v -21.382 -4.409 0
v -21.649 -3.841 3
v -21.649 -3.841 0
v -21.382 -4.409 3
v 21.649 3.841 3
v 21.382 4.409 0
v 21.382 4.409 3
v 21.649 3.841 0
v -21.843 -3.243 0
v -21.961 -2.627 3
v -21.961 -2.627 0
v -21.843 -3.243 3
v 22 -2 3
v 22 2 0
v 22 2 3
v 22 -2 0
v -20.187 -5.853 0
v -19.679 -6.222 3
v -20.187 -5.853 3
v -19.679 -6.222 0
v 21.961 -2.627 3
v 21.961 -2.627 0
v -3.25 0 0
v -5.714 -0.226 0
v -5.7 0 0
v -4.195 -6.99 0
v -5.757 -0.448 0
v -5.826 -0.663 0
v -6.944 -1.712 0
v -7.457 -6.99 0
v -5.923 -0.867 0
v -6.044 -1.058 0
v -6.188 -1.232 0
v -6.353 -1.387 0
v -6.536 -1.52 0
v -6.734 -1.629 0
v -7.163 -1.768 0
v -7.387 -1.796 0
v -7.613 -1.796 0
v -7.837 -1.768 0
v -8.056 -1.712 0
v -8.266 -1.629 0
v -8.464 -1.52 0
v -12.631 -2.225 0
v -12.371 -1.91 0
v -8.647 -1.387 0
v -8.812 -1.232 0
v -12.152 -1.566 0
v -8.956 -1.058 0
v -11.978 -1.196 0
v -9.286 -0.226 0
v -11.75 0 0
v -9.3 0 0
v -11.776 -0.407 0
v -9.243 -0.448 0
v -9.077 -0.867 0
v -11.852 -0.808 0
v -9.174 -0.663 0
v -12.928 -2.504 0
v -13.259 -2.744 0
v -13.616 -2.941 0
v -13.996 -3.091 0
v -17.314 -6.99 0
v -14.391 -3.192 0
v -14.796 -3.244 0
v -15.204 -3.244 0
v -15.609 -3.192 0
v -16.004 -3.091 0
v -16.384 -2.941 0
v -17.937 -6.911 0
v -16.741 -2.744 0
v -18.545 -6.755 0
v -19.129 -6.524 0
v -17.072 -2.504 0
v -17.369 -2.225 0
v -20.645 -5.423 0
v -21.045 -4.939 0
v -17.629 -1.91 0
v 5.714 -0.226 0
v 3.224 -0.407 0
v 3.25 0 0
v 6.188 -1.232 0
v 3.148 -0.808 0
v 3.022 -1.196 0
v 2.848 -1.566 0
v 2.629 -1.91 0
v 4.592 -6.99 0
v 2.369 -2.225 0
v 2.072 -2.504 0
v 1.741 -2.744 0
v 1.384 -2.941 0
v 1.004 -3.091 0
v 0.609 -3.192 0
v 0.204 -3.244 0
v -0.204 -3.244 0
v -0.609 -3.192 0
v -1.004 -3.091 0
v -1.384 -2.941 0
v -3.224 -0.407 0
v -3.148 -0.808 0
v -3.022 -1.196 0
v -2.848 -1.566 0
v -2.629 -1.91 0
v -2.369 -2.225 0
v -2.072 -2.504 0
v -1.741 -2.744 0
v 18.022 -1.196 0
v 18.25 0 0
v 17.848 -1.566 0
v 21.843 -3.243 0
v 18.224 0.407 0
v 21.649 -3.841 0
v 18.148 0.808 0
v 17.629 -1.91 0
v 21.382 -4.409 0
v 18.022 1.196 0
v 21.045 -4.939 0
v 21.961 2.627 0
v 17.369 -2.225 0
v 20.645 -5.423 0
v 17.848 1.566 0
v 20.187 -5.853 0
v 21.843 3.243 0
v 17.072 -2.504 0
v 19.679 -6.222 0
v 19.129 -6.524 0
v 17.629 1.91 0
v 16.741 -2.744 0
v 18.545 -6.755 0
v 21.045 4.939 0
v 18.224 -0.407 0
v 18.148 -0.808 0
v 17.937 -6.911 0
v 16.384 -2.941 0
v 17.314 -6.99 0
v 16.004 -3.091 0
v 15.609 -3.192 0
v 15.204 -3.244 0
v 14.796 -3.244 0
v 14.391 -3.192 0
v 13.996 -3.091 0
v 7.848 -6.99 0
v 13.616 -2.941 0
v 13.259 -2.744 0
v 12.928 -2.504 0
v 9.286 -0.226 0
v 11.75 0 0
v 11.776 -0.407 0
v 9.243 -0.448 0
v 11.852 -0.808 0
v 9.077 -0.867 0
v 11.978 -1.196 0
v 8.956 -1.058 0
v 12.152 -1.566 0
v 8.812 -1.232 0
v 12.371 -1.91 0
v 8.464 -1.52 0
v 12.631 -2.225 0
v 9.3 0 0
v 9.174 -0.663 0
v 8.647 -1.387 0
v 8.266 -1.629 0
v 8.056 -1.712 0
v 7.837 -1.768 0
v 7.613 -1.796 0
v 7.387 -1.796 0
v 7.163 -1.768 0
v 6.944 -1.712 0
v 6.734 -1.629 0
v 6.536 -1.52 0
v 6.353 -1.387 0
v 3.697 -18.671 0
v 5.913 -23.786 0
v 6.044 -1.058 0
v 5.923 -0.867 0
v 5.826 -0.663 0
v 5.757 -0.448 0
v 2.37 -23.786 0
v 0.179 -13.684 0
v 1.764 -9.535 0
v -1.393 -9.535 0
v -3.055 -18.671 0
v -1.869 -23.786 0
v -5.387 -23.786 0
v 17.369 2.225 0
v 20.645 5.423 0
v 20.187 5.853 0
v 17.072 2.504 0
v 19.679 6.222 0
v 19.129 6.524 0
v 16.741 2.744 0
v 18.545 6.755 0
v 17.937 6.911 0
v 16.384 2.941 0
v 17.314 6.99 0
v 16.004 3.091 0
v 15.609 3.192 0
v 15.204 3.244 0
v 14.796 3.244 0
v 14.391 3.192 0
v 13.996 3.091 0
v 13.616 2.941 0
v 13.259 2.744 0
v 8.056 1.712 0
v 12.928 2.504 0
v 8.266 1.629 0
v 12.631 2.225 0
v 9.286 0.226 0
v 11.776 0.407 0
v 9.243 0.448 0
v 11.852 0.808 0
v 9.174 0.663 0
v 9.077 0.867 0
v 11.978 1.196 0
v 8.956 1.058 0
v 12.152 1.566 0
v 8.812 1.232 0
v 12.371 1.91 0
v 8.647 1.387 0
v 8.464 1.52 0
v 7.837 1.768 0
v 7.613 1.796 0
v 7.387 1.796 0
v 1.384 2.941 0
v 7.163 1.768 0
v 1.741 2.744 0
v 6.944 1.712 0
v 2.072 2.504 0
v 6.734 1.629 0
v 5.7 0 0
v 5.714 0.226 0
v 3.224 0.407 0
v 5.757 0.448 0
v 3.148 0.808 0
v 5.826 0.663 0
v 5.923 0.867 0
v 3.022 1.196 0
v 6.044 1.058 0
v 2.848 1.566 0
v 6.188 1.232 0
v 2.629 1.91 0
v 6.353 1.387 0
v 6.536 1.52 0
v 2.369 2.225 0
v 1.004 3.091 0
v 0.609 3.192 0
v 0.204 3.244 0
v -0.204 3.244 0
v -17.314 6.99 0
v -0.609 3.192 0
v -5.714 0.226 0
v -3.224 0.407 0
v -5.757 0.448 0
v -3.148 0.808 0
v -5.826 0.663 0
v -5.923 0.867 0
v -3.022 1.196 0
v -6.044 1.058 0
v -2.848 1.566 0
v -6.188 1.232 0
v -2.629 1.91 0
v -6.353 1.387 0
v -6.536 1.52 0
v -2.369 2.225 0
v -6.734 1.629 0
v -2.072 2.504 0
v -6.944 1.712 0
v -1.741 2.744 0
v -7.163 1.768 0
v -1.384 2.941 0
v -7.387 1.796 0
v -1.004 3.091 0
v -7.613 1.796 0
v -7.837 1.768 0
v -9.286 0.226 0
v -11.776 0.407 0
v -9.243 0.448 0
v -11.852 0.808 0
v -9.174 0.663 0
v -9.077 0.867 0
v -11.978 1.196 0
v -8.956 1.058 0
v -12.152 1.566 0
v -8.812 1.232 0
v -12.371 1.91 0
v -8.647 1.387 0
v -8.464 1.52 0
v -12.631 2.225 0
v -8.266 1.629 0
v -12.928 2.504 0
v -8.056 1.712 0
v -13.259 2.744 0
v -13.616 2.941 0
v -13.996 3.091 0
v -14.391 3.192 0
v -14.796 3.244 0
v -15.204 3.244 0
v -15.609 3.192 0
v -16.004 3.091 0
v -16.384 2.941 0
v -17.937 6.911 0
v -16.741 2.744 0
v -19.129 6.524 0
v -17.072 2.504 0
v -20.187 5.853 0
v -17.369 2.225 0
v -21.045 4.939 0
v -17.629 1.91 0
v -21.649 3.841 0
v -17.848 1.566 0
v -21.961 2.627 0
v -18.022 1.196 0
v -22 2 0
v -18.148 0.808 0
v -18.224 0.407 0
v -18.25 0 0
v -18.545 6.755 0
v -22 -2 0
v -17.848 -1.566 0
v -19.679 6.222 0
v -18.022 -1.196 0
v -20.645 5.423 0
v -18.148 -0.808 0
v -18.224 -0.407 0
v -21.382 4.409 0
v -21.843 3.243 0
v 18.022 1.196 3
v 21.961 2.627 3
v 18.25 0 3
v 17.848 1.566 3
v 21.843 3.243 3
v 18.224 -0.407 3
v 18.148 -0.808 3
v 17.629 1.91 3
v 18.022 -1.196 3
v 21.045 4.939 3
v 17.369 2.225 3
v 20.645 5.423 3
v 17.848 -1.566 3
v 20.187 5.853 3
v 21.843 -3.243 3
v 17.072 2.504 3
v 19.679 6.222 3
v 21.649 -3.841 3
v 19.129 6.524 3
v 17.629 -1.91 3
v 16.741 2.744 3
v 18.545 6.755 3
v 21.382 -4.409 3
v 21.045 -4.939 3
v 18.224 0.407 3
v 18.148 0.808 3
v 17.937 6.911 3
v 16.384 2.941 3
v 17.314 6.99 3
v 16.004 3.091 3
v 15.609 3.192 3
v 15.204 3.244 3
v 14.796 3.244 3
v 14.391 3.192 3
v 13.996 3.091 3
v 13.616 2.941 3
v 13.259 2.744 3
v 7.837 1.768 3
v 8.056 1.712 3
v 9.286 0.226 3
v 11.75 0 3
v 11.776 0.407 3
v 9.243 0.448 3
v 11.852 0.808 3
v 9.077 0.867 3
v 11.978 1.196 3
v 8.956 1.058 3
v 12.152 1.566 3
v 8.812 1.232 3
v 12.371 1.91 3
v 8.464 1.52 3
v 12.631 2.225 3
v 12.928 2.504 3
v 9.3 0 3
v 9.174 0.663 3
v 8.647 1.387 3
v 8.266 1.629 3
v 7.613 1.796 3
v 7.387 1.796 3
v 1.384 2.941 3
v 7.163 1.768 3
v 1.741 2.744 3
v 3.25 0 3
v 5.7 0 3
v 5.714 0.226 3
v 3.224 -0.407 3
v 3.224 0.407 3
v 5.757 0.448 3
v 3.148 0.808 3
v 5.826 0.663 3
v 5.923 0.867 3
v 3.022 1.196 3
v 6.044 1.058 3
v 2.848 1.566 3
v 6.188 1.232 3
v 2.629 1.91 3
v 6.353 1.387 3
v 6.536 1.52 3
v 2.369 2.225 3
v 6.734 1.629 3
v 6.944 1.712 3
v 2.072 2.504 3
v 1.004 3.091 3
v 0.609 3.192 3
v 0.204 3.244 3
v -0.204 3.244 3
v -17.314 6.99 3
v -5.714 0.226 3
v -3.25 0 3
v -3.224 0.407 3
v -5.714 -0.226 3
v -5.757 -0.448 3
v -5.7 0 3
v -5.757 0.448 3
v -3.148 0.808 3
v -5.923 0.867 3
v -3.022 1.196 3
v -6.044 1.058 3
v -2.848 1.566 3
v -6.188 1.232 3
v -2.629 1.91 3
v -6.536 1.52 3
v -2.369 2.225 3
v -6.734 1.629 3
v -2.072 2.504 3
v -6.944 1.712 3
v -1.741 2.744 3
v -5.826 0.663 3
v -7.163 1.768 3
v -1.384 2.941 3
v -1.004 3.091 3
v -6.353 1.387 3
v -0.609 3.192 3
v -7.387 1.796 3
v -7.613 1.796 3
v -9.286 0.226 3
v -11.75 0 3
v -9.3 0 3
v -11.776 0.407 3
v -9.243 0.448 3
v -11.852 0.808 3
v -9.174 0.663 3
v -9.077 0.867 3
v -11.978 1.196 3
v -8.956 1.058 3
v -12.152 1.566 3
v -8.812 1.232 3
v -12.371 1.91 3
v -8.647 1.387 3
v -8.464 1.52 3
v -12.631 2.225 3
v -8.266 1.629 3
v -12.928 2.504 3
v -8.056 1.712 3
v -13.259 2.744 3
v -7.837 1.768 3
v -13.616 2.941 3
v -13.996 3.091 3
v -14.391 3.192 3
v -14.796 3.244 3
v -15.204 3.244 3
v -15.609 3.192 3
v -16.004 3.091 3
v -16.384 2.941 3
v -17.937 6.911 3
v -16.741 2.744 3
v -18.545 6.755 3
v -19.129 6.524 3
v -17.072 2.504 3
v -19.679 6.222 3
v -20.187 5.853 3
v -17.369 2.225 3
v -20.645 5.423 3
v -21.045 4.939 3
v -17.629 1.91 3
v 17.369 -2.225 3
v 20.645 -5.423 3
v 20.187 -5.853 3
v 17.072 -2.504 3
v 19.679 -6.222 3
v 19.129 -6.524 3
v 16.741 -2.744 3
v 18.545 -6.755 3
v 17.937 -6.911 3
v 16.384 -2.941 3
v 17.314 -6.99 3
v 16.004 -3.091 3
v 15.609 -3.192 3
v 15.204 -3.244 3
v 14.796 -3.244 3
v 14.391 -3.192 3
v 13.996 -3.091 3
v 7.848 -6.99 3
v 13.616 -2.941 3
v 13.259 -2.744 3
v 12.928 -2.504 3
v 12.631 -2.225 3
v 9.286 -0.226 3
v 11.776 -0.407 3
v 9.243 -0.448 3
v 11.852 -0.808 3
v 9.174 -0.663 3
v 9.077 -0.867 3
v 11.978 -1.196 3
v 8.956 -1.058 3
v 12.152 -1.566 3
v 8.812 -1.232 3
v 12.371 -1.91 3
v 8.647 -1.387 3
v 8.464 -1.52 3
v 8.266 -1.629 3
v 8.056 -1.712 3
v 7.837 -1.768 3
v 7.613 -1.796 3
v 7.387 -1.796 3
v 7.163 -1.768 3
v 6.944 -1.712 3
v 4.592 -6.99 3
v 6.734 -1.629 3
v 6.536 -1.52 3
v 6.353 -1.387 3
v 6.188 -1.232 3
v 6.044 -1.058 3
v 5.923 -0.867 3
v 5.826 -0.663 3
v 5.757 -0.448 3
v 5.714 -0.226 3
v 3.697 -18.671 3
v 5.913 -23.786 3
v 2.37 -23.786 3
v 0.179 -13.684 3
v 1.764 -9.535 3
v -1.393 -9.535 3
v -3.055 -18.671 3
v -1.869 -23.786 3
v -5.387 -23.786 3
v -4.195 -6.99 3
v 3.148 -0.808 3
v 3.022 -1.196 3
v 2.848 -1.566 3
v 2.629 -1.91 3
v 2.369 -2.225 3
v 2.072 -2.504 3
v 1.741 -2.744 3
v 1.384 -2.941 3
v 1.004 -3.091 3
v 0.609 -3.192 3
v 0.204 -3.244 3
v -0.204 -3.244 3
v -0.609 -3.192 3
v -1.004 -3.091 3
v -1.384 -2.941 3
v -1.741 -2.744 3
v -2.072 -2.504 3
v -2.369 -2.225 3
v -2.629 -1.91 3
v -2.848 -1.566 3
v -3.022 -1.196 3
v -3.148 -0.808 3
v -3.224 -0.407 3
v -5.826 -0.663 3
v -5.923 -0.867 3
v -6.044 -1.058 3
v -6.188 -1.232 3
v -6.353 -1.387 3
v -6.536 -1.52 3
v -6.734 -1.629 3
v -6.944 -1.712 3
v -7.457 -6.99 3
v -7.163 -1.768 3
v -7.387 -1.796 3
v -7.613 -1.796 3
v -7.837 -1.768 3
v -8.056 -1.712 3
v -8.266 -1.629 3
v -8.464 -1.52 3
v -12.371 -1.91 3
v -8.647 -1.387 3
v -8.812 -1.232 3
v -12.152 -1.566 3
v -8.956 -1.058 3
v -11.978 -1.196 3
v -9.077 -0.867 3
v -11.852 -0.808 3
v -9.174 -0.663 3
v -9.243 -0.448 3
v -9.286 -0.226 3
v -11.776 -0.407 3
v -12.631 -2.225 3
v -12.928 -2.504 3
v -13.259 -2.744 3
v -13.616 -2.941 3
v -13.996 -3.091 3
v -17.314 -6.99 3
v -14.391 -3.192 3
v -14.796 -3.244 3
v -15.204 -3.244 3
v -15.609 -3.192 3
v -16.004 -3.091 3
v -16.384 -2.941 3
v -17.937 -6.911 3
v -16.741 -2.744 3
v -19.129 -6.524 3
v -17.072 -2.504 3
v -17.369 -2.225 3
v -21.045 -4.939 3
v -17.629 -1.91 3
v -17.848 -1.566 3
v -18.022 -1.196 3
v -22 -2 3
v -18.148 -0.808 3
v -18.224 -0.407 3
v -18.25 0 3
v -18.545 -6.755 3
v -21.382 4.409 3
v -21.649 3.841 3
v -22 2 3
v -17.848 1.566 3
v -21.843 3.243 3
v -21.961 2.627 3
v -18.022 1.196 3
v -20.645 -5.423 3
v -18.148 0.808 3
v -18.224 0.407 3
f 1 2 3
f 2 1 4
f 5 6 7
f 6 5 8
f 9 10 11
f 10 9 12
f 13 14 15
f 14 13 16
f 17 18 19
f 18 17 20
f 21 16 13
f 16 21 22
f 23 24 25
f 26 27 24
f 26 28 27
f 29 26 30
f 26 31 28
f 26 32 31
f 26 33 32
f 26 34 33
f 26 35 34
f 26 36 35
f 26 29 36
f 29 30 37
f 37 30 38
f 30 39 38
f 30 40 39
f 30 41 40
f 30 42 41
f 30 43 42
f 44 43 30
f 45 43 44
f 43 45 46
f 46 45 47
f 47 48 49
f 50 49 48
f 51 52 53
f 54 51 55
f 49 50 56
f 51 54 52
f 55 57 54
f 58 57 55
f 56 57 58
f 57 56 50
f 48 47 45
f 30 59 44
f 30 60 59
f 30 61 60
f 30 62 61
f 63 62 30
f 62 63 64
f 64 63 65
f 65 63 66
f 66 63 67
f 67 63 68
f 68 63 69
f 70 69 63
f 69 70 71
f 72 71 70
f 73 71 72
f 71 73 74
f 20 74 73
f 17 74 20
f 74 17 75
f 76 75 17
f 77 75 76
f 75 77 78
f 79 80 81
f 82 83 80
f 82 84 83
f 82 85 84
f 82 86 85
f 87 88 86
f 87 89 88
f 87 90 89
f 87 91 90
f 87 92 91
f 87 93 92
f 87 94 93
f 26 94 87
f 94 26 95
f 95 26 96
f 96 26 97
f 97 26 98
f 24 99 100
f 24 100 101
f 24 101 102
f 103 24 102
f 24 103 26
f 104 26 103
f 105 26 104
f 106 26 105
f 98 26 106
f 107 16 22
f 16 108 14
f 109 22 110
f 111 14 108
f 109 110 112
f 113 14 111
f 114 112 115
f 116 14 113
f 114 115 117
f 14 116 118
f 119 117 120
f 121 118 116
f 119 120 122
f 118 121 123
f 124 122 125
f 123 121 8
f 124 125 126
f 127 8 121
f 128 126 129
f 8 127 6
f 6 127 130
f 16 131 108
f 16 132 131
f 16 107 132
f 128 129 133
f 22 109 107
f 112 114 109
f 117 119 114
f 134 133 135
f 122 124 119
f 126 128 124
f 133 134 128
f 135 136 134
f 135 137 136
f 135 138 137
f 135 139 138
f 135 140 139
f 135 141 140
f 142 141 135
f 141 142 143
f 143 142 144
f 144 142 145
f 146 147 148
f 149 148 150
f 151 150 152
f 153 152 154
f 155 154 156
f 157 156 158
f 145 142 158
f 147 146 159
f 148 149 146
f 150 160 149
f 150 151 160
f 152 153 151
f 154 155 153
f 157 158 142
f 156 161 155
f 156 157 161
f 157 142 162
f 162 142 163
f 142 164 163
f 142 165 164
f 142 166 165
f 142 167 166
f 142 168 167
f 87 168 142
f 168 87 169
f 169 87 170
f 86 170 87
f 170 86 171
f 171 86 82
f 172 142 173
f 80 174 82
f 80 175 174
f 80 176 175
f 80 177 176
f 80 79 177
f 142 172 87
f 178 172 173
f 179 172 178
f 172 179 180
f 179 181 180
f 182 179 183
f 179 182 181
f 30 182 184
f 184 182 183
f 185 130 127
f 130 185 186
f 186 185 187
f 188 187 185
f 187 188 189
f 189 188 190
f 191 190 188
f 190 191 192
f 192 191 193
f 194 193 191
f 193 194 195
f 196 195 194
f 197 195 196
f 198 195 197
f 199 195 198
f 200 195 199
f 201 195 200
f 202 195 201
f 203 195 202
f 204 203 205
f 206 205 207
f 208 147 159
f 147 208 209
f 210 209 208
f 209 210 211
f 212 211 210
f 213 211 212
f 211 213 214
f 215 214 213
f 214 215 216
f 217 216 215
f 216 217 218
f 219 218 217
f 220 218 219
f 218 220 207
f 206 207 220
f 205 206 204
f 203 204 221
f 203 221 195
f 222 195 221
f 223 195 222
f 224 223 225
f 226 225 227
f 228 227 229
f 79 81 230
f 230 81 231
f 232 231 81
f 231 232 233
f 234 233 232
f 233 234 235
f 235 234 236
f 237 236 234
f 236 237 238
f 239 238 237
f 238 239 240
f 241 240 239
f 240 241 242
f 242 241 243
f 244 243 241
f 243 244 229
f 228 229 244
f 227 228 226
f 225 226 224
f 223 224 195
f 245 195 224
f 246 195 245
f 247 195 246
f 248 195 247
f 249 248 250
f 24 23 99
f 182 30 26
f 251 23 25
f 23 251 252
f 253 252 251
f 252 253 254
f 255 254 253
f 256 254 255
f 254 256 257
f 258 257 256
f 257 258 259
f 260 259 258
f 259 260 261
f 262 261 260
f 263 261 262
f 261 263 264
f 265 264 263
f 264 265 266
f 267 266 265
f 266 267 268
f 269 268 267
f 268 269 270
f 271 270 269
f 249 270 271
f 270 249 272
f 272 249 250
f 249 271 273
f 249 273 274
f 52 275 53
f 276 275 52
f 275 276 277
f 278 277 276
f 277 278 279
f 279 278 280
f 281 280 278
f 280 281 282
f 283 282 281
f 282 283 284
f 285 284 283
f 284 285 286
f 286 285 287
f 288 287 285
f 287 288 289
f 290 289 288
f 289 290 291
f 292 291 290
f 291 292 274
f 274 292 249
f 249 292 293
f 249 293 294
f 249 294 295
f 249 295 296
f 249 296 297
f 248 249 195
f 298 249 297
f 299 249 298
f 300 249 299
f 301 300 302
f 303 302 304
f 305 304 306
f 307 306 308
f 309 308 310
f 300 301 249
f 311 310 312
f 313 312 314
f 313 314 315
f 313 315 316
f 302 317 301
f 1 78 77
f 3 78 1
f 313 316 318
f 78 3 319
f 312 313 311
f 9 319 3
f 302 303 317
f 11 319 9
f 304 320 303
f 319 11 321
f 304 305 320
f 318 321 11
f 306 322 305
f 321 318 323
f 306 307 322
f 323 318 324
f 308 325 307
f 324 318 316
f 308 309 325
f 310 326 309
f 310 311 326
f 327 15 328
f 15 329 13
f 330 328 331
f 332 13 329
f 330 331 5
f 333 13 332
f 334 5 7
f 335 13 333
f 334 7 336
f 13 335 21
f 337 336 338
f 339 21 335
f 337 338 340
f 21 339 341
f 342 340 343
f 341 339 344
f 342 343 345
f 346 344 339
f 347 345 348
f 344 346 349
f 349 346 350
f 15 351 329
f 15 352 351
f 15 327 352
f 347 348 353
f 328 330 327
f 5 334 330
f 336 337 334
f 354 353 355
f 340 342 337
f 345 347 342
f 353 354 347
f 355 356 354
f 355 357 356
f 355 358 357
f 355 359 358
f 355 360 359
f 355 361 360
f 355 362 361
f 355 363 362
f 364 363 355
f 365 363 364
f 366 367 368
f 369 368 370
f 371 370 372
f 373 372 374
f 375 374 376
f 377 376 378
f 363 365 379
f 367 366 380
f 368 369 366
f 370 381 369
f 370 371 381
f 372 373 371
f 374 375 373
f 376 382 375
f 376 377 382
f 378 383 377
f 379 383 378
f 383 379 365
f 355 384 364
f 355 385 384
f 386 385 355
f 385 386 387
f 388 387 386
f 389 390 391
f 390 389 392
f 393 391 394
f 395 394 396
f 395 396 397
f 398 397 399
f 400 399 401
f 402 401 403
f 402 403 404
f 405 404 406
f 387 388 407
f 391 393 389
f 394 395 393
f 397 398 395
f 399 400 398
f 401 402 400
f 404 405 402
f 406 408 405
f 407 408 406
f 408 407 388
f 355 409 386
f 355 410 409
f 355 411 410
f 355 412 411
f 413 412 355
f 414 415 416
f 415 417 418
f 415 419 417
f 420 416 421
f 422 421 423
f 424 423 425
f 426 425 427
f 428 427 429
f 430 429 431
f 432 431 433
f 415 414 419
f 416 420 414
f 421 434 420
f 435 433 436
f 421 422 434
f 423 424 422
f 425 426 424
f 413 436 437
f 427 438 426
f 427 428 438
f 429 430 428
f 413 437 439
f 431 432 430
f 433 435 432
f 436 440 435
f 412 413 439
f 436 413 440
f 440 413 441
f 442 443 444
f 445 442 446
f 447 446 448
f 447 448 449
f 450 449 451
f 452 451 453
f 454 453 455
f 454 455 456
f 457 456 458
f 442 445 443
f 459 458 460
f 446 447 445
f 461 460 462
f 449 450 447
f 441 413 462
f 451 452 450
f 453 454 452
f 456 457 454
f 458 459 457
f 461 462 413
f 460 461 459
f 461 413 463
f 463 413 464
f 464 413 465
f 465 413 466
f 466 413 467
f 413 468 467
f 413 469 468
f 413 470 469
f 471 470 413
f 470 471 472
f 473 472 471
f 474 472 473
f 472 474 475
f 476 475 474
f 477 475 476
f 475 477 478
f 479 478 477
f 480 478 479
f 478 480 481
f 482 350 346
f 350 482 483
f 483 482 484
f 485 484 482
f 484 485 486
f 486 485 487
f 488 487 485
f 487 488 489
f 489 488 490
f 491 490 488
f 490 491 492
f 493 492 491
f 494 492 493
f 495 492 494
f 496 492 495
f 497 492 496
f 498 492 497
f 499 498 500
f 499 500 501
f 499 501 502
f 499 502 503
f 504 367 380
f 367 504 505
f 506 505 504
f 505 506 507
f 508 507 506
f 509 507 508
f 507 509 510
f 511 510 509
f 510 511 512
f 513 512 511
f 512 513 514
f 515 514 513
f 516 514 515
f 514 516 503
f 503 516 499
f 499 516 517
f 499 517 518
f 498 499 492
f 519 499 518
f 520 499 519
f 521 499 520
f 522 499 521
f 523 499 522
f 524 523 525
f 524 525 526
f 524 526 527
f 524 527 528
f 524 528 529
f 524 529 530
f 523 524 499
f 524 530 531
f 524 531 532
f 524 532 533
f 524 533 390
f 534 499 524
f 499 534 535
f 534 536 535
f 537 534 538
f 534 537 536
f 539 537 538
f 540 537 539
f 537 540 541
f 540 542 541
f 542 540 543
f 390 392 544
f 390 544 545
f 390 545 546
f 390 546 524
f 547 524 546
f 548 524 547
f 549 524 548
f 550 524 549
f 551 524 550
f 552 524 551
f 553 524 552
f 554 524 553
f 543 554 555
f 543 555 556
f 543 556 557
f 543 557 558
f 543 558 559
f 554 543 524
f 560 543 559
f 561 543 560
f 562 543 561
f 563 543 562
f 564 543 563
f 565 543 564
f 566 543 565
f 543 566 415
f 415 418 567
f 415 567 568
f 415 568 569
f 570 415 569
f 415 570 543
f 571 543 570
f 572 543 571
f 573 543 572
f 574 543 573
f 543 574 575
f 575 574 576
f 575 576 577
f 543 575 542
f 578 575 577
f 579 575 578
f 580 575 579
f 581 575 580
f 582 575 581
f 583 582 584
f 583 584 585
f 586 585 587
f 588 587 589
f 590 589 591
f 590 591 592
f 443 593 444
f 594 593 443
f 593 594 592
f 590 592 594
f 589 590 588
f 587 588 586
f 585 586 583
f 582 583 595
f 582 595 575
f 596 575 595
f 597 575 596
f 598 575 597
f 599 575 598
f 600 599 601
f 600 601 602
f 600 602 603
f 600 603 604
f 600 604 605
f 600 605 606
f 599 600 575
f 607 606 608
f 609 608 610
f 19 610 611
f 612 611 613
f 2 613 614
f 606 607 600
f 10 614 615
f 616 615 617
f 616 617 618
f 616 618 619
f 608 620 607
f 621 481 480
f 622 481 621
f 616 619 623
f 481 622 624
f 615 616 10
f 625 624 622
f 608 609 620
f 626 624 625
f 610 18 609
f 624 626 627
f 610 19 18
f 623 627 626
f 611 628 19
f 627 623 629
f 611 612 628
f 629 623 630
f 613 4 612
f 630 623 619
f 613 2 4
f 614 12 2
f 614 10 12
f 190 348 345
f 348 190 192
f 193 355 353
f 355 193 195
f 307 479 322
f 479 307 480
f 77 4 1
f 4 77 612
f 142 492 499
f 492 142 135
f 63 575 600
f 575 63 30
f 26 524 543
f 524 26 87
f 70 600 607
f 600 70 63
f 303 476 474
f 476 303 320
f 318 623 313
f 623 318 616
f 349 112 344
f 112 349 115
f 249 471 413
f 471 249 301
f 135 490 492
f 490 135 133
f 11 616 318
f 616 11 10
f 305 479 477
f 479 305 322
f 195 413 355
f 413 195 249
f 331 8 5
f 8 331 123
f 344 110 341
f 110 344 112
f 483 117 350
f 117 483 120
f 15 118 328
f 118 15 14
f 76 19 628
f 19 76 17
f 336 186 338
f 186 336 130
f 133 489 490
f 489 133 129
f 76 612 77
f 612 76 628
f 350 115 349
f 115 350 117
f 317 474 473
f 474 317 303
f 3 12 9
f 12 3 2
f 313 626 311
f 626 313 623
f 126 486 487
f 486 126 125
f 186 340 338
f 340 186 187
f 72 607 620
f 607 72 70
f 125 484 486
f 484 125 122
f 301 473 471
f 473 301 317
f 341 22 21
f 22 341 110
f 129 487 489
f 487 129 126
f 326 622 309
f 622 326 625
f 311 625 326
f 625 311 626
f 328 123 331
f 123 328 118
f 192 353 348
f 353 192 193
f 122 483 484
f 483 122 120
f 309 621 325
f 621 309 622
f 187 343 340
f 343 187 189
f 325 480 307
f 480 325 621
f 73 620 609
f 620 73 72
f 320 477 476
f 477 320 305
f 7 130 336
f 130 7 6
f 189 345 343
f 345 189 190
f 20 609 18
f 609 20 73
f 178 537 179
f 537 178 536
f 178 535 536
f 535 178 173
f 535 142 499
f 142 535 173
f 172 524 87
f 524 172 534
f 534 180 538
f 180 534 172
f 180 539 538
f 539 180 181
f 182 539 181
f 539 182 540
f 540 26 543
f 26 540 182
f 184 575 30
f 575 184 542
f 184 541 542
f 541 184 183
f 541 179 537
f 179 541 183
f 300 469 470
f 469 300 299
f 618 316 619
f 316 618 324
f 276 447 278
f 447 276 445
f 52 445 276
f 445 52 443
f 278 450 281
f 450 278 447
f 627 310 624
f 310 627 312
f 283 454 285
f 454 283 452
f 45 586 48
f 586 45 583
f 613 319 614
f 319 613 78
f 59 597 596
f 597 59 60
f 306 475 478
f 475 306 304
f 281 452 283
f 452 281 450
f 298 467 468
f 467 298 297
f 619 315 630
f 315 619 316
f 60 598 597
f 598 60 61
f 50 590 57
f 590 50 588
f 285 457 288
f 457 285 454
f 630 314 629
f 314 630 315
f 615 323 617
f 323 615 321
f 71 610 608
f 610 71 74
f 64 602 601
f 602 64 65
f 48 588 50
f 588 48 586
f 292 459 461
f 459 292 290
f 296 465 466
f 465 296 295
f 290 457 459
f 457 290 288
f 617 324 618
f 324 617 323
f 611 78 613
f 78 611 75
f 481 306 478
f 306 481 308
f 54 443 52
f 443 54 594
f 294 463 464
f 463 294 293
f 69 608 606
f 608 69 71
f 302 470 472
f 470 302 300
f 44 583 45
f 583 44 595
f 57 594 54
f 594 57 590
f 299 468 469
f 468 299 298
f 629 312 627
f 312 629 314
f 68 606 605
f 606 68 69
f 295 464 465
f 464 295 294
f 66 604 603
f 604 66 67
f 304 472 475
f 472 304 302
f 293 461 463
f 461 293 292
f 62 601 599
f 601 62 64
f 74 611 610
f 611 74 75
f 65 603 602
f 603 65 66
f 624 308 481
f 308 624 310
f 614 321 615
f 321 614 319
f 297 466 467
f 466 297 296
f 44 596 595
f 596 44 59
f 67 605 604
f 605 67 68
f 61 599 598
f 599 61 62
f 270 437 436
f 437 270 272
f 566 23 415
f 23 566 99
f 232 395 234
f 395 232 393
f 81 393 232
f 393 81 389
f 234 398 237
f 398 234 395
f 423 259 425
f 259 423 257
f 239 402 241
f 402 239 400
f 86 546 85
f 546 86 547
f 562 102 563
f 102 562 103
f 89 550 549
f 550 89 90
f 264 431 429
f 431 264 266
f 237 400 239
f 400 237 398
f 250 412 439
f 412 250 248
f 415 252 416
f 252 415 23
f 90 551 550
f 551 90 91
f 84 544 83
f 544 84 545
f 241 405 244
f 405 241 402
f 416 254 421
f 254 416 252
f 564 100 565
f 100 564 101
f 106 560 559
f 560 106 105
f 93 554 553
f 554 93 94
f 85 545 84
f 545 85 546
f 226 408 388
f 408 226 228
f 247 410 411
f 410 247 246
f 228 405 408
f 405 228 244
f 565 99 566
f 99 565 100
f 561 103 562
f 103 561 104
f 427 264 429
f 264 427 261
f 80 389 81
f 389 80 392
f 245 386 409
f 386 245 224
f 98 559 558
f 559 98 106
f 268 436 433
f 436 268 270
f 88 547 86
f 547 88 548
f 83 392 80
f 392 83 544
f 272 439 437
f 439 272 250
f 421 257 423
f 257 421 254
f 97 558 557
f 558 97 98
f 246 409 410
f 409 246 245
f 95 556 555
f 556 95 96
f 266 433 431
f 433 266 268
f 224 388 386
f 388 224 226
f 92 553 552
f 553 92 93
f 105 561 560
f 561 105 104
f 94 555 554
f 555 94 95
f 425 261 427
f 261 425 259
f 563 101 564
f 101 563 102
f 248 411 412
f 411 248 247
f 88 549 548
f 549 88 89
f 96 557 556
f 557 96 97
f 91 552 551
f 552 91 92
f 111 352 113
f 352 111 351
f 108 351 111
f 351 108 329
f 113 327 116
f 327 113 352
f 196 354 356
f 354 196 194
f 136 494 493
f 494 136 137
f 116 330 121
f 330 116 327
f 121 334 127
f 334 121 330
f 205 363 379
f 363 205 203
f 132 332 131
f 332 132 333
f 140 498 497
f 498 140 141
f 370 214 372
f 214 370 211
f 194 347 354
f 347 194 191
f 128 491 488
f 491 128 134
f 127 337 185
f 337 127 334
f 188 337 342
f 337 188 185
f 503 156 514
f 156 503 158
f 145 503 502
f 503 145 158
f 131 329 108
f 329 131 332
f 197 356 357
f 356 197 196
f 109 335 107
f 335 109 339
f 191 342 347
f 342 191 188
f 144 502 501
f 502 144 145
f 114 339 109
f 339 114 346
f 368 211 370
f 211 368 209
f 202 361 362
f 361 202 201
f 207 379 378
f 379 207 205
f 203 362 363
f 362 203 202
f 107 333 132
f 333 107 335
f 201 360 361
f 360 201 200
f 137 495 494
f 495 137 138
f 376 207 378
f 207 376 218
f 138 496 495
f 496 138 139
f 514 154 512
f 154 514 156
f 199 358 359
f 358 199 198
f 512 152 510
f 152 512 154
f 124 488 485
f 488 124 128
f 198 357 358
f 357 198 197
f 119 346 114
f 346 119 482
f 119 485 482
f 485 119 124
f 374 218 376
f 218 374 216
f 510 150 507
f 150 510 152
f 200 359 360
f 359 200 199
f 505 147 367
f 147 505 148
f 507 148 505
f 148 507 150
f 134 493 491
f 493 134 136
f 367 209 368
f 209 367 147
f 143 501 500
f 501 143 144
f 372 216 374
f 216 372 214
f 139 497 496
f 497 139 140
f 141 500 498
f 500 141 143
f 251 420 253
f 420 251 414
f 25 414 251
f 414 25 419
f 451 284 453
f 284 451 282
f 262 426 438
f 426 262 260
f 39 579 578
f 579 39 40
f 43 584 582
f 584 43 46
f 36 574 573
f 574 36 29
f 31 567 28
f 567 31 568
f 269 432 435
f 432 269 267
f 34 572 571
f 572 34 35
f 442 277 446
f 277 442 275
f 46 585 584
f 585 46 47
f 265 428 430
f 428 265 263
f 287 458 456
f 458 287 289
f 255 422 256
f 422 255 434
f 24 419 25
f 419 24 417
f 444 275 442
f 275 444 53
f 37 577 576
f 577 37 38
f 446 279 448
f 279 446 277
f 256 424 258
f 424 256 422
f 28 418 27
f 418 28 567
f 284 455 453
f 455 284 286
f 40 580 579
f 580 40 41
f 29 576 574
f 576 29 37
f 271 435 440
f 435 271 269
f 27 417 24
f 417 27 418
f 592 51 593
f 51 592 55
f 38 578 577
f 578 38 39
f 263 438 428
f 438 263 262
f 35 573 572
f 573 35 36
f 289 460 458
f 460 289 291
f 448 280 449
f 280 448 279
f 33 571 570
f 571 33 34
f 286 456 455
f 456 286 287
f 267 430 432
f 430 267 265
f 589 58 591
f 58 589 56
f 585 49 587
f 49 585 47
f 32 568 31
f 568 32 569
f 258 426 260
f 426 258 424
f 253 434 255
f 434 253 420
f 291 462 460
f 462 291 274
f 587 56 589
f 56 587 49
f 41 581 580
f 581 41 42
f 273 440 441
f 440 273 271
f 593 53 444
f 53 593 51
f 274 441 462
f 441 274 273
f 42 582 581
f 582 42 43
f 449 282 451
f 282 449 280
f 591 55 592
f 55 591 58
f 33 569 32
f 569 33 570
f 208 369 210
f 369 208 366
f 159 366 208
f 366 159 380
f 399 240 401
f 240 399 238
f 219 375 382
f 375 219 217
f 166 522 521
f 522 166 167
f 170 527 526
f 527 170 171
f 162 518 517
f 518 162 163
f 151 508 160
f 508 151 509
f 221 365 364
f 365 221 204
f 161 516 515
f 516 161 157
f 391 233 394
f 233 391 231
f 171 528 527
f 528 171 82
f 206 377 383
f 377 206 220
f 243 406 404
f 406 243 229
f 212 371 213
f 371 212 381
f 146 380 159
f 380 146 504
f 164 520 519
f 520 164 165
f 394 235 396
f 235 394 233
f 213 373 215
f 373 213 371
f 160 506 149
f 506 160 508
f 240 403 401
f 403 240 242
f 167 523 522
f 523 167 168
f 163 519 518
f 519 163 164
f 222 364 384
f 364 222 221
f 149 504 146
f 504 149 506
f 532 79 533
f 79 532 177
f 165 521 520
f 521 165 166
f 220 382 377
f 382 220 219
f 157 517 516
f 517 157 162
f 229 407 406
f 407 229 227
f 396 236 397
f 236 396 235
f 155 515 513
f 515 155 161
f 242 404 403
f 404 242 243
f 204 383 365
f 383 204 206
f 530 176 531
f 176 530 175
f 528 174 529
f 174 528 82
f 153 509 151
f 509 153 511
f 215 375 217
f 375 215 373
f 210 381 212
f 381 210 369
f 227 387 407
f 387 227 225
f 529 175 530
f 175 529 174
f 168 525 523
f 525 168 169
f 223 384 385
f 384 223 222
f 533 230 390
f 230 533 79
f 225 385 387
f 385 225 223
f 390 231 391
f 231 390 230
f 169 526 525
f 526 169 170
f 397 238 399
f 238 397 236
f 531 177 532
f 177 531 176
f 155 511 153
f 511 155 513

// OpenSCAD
$fn = 50;


difference() {
	union() {
		hull() {
			translate(v = [-17.0000000000, 2.0000000000, 0]) {
				cylinder(h = 3, r = 5);
			}
			translate(v = [17.0000000000, 2.0000000000, 0]) {
				cylinder(h = 3, r = 5);
			}
			translate(v = [-17.0000000000, -2.0000000000, 0]) {
				cylinder(h = 3, r = 5);
			}
			translate(v = [17.0000000000, -2.0000000000, 0]) {
				cylinder(h = 3, r = 5);
			}
		}
		translate(v = [0, -5, 0]) {
			linear_extrude(height = 3) {
				text(font = "DejaVu Sans Mono:style=Bold", halign = "center", size = 19.0000000000, text = "W", valign = "top");
			}
		}
	}
	union() {
		translate(v = [-15.0000000000, 0.0000000000, 0]) {
			translate(v = [0, 0, -100]) {
				cylinder(h = 200, r = 3.2500000000);
			}
		}
		translate(v = [0, 0, -100]) {
			cylinder(h = 200, r = 3.2500000000);
		}
		translate(v = [15.0000000000, 0.0000000000, 0]) {
			translate(v = [0, 0, -100]) {
				cylinder(h = 200, r = 3.2500000000);
			}
		}
		translate(v = [-15.0000000000, 0.0000000000, 0]) {
			translate(v = [0, 0, -100]) {
				cylinder(h = 200, r = 1.8000000000);
			}
		}
		translate(v = [-7.5000000000, 0.0000000000, 0]) {
			translate(v = [0, 0, -100]) {
				cylinder(h = 200, r = 1.8000000000);
			}
		}
		translate(v = [0, 0, -100]) {
			cylinder(h = 200, r = 1.8000000000);
		}
		translate(v = [7.5000000000, 0.0000000000, 0]) {
			translate(v = [0, 0, -100]) {
				cylinder(h = 200, r = 1.8000000000);
			}
		}
		translate(v = [15.0000000000, 0.0000000000, 0]) {
			translate(v = [0, 0, -100]) {
				cylinder(h = 200, r = 1.8000000000);
			}
		}
	}
}
